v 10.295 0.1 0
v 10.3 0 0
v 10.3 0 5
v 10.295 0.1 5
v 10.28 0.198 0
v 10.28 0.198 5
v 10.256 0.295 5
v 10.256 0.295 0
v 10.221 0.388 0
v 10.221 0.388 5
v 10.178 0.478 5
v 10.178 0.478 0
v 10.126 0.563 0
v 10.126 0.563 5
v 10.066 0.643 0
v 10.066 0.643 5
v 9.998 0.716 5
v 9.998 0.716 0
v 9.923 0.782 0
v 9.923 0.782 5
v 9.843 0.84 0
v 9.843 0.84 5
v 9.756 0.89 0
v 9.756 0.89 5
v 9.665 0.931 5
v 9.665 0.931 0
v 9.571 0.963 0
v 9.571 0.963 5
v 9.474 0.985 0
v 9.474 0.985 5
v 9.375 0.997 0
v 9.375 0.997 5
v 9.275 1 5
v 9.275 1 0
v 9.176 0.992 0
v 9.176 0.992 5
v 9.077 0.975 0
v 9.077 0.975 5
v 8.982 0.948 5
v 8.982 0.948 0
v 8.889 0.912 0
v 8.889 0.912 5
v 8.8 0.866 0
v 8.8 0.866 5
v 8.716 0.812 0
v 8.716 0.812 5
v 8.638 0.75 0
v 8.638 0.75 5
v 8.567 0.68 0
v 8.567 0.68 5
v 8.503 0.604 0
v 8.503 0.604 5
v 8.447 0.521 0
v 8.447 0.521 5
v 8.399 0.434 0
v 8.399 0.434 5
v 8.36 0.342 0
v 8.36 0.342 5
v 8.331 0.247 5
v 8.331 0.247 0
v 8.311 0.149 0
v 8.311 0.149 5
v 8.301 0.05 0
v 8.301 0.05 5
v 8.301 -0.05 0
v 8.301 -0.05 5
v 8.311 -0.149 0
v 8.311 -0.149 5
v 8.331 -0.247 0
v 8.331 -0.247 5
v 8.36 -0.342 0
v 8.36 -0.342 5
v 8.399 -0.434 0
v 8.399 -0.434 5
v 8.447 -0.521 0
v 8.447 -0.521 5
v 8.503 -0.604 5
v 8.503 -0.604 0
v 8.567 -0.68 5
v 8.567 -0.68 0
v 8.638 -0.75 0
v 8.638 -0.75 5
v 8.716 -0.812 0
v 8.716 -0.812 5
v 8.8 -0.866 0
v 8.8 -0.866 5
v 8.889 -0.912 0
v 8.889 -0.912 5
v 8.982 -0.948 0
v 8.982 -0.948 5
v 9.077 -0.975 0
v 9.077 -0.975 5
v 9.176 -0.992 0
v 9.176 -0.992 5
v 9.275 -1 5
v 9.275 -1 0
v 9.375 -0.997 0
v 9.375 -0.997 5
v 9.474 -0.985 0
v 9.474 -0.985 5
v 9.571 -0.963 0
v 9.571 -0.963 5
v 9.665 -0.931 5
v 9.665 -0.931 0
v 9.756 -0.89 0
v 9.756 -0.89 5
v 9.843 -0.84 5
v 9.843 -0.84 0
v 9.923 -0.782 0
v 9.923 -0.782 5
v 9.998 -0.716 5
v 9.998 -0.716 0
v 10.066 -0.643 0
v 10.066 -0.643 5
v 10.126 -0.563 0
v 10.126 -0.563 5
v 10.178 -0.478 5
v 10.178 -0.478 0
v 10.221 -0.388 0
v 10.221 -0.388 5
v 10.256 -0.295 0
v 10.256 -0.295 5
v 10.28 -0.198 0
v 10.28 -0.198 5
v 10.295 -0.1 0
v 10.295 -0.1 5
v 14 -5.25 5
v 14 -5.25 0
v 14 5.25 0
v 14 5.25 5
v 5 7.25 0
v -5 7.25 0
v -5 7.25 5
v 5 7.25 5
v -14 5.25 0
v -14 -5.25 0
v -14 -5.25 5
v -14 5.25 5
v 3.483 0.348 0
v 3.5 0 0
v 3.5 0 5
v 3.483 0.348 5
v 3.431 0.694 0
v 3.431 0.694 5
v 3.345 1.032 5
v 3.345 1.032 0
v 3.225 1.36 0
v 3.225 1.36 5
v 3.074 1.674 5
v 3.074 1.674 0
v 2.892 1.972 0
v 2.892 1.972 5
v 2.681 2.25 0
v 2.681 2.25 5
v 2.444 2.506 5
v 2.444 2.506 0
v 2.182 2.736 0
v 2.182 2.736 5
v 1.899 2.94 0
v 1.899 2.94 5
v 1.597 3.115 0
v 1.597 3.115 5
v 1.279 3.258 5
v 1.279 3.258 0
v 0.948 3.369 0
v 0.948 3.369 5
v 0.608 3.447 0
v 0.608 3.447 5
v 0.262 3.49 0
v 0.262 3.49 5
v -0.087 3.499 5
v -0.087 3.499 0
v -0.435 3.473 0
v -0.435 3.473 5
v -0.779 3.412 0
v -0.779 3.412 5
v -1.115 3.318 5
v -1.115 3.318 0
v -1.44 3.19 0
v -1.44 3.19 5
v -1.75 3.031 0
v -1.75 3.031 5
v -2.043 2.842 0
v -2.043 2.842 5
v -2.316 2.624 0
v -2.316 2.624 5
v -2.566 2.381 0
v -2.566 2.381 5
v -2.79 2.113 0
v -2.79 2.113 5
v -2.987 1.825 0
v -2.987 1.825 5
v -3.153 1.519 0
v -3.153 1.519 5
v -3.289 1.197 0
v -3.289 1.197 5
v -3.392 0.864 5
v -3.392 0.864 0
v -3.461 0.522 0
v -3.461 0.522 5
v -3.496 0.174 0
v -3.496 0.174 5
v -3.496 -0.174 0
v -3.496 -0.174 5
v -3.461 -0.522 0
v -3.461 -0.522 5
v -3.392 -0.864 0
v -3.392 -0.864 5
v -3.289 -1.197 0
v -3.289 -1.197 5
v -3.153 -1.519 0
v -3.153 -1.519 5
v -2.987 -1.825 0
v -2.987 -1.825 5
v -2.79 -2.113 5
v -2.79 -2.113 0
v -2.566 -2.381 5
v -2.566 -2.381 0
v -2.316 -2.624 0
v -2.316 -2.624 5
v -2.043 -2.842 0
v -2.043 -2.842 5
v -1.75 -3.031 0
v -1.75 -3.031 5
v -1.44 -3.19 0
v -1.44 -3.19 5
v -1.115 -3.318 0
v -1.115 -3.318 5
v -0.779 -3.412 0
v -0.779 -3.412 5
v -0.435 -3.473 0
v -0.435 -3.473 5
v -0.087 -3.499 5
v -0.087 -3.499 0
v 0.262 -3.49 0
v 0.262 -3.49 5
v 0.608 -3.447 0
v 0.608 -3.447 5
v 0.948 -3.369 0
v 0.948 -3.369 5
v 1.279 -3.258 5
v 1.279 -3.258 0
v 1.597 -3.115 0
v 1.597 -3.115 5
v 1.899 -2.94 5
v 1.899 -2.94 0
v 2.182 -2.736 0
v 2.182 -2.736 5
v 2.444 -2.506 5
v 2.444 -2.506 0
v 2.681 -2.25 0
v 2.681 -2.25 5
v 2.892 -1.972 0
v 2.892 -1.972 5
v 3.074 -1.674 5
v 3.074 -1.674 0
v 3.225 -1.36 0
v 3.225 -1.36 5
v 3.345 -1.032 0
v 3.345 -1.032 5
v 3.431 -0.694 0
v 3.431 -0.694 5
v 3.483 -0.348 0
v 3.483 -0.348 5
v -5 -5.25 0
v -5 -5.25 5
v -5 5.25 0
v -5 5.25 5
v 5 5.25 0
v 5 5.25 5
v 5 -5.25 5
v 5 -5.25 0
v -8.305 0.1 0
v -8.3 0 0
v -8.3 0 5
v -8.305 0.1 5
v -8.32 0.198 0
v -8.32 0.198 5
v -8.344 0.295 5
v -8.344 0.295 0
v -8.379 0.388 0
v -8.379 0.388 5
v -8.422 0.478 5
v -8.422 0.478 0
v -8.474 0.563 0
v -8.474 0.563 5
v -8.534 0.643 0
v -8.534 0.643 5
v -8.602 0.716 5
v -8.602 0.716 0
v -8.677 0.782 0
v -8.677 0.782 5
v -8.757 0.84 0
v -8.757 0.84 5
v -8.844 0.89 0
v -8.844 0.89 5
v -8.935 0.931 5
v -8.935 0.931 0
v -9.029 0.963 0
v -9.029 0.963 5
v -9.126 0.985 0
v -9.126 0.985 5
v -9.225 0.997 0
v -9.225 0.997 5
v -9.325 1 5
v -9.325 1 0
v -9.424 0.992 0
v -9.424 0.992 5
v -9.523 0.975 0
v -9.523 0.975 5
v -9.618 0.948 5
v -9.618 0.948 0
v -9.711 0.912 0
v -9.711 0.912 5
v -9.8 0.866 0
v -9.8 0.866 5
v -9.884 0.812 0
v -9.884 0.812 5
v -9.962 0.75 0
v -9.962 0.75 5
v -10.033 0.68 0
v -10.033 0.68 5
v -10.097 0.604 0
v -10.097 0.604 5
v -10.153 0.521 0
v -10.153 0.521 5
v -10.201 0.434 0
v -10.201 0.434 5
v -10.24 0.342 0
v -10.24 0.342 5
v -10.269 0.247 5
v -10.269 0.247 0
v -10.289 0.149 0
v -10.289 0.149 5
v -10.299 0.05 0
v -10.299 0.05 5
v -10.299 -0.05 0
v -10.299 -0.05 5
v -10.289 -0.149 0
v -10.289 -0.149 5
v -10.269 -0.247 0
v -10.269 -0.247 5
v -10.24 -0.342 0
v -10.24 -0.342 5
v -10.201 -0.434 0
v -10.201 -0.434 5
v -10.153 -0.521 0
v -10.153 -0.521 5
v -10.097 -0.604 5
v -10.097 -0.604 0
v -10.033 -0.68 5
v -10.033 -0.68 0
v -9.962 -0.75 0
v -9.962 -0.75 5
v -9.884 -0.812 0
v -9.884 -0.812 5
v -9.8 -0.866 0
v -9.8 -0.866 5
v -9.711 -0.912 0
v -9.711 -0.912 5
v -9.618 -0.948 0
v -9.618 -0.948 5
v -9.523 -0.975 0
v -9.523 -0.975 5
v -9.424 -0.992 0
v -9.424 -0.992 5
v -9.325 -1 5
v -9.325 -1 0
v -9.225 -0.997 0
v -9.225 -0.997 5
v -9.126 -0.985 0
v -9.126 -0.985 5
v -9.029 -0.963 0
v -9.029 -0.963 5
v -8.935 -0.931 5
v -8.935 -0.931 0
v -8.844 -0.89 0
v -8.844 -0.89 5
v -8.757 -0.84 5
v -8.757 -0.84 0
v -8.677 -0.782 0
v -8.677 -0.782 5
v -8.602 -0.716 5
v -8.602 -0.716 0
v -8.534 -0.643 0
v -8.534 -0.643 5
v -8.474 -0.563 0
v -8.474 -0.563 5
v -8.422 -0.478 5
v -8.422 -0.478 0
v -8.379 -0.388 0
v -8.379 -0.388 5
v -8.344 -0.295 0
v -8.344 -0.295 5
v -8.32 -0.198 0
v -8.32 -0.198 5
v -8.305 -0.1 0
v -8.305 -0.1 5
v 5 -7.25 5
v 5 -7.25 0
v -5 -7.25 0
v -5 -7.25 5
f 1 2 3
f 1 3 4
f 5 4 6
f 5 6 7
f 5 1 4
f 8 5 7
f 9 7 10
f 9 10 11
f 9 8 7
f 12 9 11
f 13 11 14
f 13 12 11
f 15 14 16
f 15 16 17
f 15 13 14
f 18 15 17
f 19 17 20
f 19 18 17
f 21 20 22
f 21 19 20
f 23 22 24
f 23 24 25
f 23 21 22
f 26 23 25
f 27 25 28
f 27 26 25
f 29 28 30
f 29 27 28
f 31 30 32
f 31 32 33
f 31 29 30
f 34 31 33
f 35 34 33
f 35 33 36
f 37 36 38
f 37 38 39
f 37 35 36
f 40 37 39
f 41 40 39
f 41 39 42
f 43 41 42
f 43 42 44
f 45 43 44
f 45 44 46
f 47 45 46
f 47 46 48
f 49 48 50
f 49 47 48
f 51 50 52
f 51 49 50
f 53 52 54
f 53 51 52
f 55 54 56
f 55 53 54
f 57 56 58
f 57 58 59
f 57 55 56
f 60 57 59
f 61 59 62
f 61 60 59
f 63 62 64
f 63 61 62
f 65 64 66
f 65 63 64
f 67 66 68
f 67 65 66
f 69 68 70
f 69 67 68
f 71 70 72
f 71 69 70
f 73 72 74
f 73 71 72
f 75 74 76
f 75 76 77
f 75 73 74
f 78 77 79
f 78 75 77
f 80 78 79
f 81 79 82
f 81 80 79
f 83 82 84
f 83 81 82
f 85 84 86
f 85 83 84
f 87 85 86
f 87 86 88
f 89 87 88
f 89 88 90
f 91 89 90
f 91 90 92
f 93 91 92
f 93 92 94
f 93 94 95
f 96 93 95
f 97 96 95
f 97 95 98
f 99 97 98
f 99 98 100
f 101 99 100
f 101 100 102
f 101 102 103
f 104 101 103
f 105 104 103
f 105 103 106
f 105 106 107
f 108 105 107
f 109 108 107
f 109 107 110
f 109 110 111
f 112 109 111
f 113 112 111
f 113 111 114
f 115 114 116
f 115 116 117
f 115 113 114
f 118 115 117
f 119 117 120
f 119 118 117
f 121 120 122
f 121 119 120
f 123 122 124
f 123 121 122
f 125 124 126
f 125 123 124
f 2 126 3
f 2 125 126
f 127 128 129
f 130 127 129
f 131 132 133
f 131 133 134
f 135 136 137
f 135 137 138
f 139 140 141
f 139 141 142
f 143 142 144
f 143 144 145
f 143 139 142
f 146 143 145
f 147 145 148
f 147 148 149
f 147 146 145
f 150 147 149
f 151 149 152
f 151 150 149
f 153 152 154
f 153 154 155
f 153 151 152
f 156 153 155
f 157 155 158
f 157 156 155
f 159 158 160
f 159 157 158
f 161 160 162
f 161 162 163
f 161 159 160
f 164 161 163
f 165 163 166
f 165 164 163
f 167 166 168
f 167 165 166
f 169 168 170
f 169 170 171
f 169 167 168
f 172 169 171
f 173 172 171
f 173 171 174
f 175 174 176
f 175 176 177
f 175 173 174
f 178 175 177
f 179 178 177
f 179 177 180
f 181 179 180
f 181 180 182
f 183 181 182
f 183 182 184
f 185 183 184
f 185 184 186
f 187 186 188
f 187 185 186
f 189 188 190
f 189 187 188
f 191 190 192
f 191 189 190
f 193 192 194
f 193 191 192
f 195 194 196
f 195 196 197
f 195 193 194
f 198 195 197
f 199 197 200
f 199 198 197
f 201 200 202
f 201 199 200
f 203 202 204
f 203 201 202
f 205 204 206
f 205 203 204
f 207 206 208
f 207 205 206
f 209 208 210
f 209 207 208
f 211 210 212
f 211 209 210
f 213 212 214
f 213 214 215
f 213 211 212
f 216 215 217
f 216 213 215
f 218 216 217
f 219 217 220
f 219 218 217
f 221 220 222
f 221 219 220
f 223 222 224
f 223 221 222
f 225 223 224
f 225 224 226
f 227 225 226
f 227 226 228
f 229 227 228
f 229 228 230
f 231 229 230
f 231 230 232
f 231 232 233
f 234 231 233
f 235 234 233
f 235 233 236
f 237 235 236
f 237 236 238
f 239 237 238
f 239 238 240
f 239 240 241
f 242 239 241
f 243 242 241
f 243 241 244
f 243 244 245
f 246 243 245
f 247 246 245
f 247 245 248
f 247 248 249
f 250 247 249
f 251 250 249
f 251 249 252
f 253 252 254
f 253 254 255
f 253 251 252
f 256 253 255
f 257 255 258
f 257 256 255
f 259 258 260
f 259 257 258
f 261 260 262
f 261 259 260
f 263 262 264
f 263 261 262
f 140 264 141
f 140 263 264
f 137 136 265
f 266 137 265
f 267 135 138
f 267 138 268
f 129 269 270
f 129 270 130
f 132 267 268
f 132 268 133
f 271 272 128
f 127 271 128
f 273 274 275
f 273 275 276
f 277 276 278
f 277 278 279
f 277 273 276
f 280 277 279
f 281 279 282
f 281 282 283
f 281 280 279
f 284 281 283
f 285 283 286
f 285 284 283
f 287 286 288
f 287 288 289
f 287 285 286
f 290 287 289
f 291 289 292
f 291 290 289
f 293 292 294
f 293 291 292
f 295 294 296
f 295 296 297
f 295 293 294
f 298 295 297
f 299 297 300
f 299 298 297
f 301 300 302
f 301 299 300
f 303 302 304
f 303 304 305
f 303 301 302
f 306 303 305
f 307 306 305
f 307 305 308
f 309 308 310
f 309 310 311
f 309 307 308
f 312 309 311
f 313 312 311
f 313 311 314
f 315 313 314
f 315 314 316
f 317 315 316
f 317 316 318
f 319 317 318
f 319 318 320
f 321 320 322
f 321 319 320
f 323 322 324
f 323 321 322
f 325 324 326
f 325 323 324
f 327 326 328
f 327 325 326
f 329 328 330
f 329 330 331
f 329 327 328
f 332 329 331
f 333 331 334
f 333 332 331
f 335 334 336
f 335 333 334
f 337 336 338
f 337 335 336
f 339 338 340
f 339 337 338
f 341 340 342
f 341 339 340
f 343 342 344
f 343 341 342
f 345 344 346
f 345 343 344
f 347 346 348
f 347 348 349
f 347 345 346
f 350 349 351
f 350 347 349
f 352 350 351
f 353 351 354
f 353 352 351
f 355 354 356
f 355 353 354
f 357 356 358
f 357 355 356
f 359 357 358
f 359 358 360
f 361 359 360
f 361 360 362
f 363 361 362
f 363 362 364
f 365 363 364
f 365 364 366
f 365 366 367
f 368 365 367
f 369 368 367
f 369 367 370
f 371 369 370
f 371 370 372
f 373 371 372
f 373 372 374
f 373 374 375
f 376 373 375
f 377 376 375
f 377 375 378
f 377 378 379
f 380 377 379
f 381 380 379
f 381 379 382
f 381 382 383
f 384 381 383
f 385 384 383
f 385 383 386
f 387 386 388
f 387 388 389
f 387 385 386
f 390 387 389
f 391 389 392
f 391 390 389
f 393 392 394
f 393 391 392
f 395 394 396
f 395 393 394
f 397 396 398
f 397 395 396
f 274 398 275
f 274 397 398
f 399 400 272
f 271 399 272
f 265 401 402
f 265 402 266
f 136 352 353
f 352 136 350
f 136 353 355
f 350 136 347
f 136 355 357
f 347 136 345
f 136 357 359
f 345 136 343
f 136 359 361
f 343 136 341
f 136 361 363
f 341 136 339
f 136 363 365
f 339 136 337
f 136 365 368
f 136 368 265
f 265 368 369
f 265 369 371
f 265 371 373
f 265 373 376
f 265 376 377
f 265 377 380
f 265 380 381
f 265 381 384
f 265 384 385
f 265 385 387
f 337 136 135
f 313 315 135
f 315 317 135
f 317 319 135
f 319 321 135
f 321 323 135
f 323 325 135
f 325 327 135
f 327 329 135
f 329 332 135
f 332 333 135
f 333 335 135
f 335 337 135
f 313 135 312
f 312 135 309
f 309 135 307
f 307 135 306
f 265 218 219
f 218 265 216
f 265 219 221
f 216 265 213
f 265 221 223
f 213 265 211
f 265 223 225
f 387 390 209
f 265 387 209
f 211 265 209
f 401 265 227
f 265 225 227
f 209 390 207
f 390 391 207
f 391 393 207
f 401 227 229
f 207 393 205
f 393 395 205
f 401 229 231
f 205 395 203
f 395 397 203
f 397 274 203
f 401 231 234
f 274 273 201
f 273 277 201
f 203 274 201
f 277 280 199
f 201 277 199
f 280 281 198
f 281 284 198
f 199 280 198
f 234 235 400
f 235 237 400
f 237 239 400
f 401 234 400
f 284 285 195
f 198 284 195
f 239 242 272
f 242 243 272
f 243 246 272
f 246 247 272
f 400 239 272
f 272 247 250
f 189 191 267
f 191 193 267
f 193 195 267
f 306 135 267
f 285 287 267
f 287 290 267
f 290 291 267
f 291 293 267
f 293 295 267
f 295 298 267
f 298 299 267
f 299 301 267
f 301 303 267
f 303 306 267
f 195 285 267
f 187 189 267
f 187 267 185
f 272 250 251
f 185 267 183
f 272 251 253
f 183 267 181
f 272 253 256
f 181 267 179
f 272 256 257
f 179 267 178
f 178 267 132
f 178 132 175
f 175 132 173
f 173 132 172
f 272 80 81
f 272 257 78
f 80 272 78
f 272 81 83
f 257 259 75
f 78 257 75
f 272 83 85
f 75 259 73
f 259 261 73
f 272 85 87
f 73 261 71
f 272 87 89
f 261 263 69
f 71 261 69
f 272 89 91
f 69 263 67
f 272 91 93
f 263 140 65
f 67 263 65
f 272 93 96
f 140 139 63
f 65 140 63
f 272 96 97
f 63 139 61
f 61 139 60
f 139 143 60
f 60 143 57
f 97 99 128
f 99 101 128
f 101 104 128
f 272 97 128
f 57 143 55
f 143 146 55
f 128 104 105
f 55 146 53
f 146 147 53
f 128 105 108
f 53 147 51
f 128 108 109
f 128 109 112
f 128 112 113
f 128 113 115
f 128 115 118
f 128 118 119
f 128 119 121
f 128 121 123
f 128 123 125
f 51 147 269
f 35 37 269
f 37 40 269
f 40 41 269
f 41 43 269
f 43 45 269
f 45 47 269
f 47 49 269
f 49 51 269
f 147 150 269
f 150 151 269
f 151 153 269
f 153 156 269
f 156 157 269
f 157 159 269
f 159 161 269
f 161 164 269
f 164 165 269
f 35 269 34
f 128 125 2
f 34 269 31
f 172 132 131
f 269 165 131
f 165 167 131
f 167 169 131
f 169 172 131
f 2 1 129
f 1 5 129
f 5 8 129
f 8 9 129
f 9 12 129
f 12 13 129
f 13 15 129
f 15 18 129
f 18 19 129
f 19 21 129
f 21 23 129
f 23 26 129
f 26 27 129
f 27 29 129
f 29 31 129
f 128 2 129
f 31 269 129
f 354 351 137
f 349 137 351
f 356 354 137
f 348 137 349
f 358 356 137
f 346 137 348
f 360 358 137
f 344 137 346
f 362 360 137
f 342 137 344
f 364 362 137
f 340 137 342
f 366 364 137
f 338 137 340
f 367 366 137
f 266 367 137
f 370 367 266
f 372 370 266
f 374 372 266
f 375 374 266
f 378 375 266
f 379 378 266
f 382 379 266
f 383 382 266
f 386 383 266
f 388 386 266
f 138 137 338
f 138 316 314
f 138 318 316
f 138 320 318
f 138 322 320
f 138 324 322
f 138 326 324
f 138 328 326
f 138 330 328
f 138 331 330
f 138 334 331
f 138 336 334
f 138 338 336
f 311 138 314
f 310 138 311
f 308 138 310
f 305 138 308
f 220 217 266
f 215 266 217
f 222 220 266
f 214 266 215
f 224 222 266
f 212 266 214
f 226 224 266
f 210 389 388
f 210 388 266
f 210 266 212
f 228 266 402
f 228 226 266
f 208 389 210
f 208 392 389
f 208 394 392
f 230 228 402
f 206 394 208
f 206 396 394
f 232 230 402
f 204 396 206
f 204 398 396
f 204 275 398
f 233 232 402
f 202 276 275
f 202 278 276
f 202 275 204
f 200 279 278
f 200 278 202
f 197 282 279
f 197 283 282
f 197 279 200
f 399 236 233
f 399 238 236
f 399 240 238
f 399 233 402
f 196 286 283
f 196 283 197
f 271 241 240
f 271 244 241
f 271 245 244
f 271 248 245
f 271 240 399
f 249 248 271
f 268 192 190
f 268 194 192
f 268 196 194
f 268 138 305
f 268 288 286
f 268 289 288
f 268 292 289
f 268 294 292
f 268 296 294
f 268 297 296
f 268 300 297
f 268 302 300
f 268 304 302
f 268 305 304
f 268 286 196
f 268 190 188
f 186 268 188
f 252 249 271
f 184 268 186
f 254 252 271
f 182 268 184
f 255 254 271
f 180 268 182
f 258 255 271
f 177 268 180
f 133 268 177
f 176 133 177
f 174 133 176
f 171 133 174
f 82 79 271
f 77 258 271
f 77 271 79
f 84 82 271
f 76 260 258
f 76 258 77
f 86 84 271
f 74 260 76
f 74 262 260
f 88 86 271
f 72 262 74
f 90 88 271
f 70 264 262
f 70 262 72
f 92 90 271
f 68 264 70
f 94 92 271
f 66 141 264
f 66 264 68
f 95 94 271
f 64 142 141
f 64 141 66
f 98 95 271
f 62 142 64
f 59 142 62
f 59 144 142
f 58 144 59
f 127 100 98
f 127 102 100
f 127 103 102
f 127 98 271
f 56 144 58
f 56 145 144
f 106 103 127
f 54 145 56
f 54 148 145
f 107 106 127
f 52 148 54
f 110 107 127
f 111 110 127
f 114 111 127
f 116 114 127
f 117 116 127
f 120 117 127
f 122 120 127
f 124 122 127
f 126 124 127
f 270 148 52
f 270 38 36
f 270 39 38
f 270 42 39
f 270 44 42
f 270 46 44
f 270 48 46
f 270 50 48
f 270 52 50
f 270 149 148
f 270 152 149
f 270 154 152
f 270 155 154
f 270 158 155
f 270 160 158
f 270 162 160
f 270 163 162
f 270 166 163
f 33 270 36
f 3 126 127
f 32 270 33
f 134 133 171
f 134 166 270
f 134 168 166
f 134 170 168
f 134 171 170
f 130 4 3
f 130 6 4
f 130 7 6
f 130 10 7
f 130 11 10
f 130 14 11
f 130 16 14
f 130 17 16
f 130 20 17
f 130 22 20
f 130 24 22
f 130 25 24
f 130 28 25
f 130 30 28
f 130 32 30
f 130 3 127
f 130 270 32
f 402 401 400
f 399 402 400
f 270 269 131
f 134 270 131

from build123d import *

# Parameters (mm, degrees)
SKETCH1_W           = 28
SKETCH1_H           = 10.5
SKETCH1_R           = 3.5
SKETCH1_R_2         = 1
SKETCH1_W_2         = 10
SKETCH1_H_2         = 2
BOSS_EXTRUDE1_DEPTH = 5


with BuildPart() as part:
    # Sketch1 → Boss-Extrude1 (new body)
    with BuildSketch(Plane.XY):
        Rectangle(SKETCH1_W, SKETCH1_H)
        Circle(SKETCH1_R, mode=Mode.SUBTRACT)
        with Locations((9.3, 0)):
            Circle(SKETCH1_R_2, mode=Mode.SUBTRACT)
        with Locations((-9.3, 0)):
            Circle(SKETCH1_R_2, mode=Mode.SUBTRACT)
        with Locations((0, 6.25)):
            Rectangle(SKETCH1_W_2, SKETCH1_H_2)
        with Locations((0, -6.25)):
            Rectangle(SKETCH1_W_2, SKETCH1_H_2)
    extrude(amount=BOSS_EXTRUDE1_DEPTH)


solid = part.part
